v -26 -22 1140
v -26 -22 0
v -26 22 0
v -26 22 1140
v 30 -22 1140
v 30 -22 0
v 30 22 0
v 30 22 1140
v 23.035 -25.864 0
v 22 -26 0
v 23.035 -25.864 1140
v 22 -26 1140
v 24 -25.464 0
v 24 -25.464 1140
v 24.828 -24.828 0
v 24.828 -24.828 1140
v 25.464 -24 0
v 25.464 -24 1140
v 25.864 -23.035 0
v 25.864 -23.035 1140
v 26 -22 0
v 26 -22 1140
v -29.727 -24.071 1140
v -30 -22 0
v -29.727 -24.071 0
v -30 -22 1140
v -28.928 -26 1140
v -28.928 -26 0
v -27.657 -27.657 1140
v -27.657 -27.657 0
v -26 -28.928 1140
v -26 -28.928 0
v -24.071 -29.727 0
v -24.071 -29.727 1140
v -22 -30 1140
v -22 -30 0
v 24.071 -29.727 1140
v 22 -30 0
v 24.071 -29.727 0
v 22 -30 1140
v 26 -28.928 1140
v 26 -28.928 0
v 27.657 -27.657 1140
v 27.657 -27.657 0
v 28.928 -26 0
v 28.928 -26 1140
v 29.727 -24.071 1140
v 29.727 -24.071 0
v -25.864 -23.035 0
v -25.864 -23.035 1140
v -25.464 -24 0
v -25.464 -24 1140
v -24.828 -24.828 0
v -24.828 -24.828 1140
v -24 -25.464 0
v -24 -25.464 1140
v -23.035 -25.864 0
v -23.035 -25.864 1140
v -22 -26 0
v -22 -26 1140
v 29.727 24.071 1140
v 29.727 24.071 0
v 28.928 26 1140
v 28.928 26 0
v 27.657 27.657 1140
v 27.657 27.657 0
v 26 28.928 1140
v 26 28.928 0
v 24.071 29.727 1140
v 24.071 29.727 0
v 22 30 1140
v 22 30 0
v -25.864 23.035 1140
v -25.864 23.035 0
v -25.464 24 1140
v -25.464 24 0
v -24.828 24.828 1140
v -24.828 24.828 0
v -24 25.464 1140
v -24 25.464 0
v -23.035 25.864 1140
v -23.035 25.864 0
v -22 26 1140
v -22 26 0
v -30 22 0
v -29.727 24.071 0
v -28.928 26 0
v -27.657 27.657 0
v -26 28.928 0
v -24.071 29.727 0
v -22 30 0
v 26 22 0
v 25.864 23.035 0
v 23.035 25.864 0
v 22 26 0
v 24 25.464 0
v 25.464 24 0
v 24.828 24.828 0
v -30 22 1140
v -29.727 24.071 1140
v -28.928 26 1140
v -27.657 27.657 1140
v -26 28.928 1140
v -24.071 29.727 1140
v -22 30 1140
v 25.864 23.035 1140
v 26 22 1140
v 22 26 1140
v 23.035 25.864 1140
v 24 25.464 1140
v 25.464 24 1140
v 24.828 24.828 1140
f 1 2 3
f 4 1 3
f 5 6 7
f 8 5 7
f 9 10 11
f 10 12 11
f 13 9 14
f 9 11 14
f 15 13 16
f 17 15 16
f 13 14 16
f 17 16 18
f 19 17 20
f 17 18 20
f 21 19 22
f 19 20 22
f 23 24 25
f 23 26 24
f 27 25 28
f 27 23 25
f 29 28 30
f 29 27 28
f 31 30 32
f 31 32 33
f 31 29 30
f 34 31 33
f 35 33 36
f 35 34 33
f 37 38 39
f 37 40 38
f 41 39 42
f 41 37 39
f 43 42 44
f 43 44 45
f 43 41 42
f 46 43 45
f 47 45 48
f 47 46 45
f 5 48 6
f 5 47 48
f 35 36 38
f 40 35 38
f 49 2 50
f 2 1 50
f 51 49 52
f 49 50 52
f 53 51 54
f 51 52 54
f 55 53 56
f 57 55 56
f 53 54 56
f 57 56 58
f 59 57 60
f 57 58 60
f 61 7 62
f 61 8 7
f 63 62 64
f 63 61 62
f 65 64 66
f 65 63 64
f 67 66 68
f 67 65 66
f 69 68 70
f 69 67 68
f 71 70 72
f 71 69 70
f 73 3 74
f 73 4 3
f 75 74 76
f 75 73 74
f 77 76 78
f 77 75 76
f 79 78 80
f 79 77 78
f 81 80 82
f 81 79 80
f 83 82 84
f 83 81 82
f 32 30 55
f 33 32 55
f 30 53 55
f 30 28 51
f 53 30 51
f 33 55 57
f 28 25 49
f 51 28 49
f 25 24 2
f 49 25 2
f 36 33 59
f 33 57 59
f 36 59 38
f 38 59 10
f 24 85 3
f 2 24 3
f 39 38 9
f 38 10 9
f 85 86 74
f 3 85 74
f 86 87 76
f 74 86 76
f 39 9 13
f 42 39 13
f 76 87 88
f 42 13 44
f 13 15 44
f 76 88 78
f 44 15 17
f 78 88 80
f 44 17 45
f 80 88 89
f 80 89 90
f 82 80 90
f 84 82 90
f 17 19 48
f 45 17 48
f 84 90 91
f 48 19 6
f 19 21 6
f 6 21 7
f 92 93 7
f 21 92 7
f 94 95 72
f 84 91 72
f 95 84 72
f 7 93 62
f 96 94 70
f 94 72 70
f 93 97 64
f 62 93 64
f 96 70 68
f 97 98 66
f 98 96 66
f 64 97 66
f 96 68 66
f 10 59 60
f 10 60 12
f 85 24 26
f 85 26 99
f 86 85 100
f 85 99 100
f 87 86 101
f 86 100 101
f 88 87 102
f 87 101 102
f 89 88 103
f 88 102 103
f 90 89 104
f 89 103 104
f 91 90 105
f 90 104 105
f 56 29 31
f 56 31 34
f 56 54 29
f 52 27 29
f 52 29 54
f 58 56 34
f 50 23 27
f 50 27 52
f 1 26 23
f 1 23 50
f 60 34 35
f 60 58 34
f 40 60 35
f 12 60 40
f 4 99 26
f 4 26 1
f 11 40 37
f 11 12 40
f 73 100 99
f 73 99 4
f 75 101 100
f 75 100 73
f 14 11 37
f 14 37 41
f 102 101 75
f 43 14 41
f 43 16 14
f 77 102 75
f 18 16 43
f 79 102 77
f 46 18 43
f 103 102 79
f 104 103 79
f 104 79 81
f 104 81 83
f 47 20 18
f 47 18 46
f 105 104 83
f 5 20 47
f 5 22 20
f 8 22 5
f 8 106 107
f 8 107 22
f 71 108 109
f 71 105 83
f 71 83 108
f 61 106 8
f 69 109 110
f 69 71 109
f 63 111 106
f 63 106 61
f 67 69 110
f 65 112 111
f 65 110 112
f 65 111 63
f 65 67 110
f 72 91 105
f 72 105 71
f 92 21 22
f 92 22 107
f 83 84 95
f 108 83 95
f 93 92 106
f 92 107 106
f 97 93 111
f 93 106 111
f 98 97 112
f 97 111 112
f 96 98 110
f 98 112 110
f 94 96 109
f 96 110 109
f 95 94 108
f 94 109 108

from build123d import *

# Parameters (mm, degrees)
F0_W     = 60
F0_H     = 60
F1_DEPTH = 1140
F2_R     = 8
F3_T     = -4


with BuildPart() as f1:
    # F0 (on Top) → F1 (new body)
    with BuildSketch(Plane.XY):
        Rectangle(F0_W, F0_H)
    extrude(amount=F1_DEPTH)

    # F2
    f2_edges = [f1.edges().sort_by_distance(p)[0] for p in [
        (-30, -30, 570),
        (-30, 30, 570),
        (30, -30, 570),
        (30, 30, 570),
    ]]
    fillet(f2_edges, radius=F2_R)

    # F3
    f3_openings = [f1.faces().sort_by_distance(p)[0] for p in [
        (0, 0, 1140),
        (0, 0, 0),
    ]]
    offset(amount=F3_T, openings=f3_openings)


solid = f1.part
